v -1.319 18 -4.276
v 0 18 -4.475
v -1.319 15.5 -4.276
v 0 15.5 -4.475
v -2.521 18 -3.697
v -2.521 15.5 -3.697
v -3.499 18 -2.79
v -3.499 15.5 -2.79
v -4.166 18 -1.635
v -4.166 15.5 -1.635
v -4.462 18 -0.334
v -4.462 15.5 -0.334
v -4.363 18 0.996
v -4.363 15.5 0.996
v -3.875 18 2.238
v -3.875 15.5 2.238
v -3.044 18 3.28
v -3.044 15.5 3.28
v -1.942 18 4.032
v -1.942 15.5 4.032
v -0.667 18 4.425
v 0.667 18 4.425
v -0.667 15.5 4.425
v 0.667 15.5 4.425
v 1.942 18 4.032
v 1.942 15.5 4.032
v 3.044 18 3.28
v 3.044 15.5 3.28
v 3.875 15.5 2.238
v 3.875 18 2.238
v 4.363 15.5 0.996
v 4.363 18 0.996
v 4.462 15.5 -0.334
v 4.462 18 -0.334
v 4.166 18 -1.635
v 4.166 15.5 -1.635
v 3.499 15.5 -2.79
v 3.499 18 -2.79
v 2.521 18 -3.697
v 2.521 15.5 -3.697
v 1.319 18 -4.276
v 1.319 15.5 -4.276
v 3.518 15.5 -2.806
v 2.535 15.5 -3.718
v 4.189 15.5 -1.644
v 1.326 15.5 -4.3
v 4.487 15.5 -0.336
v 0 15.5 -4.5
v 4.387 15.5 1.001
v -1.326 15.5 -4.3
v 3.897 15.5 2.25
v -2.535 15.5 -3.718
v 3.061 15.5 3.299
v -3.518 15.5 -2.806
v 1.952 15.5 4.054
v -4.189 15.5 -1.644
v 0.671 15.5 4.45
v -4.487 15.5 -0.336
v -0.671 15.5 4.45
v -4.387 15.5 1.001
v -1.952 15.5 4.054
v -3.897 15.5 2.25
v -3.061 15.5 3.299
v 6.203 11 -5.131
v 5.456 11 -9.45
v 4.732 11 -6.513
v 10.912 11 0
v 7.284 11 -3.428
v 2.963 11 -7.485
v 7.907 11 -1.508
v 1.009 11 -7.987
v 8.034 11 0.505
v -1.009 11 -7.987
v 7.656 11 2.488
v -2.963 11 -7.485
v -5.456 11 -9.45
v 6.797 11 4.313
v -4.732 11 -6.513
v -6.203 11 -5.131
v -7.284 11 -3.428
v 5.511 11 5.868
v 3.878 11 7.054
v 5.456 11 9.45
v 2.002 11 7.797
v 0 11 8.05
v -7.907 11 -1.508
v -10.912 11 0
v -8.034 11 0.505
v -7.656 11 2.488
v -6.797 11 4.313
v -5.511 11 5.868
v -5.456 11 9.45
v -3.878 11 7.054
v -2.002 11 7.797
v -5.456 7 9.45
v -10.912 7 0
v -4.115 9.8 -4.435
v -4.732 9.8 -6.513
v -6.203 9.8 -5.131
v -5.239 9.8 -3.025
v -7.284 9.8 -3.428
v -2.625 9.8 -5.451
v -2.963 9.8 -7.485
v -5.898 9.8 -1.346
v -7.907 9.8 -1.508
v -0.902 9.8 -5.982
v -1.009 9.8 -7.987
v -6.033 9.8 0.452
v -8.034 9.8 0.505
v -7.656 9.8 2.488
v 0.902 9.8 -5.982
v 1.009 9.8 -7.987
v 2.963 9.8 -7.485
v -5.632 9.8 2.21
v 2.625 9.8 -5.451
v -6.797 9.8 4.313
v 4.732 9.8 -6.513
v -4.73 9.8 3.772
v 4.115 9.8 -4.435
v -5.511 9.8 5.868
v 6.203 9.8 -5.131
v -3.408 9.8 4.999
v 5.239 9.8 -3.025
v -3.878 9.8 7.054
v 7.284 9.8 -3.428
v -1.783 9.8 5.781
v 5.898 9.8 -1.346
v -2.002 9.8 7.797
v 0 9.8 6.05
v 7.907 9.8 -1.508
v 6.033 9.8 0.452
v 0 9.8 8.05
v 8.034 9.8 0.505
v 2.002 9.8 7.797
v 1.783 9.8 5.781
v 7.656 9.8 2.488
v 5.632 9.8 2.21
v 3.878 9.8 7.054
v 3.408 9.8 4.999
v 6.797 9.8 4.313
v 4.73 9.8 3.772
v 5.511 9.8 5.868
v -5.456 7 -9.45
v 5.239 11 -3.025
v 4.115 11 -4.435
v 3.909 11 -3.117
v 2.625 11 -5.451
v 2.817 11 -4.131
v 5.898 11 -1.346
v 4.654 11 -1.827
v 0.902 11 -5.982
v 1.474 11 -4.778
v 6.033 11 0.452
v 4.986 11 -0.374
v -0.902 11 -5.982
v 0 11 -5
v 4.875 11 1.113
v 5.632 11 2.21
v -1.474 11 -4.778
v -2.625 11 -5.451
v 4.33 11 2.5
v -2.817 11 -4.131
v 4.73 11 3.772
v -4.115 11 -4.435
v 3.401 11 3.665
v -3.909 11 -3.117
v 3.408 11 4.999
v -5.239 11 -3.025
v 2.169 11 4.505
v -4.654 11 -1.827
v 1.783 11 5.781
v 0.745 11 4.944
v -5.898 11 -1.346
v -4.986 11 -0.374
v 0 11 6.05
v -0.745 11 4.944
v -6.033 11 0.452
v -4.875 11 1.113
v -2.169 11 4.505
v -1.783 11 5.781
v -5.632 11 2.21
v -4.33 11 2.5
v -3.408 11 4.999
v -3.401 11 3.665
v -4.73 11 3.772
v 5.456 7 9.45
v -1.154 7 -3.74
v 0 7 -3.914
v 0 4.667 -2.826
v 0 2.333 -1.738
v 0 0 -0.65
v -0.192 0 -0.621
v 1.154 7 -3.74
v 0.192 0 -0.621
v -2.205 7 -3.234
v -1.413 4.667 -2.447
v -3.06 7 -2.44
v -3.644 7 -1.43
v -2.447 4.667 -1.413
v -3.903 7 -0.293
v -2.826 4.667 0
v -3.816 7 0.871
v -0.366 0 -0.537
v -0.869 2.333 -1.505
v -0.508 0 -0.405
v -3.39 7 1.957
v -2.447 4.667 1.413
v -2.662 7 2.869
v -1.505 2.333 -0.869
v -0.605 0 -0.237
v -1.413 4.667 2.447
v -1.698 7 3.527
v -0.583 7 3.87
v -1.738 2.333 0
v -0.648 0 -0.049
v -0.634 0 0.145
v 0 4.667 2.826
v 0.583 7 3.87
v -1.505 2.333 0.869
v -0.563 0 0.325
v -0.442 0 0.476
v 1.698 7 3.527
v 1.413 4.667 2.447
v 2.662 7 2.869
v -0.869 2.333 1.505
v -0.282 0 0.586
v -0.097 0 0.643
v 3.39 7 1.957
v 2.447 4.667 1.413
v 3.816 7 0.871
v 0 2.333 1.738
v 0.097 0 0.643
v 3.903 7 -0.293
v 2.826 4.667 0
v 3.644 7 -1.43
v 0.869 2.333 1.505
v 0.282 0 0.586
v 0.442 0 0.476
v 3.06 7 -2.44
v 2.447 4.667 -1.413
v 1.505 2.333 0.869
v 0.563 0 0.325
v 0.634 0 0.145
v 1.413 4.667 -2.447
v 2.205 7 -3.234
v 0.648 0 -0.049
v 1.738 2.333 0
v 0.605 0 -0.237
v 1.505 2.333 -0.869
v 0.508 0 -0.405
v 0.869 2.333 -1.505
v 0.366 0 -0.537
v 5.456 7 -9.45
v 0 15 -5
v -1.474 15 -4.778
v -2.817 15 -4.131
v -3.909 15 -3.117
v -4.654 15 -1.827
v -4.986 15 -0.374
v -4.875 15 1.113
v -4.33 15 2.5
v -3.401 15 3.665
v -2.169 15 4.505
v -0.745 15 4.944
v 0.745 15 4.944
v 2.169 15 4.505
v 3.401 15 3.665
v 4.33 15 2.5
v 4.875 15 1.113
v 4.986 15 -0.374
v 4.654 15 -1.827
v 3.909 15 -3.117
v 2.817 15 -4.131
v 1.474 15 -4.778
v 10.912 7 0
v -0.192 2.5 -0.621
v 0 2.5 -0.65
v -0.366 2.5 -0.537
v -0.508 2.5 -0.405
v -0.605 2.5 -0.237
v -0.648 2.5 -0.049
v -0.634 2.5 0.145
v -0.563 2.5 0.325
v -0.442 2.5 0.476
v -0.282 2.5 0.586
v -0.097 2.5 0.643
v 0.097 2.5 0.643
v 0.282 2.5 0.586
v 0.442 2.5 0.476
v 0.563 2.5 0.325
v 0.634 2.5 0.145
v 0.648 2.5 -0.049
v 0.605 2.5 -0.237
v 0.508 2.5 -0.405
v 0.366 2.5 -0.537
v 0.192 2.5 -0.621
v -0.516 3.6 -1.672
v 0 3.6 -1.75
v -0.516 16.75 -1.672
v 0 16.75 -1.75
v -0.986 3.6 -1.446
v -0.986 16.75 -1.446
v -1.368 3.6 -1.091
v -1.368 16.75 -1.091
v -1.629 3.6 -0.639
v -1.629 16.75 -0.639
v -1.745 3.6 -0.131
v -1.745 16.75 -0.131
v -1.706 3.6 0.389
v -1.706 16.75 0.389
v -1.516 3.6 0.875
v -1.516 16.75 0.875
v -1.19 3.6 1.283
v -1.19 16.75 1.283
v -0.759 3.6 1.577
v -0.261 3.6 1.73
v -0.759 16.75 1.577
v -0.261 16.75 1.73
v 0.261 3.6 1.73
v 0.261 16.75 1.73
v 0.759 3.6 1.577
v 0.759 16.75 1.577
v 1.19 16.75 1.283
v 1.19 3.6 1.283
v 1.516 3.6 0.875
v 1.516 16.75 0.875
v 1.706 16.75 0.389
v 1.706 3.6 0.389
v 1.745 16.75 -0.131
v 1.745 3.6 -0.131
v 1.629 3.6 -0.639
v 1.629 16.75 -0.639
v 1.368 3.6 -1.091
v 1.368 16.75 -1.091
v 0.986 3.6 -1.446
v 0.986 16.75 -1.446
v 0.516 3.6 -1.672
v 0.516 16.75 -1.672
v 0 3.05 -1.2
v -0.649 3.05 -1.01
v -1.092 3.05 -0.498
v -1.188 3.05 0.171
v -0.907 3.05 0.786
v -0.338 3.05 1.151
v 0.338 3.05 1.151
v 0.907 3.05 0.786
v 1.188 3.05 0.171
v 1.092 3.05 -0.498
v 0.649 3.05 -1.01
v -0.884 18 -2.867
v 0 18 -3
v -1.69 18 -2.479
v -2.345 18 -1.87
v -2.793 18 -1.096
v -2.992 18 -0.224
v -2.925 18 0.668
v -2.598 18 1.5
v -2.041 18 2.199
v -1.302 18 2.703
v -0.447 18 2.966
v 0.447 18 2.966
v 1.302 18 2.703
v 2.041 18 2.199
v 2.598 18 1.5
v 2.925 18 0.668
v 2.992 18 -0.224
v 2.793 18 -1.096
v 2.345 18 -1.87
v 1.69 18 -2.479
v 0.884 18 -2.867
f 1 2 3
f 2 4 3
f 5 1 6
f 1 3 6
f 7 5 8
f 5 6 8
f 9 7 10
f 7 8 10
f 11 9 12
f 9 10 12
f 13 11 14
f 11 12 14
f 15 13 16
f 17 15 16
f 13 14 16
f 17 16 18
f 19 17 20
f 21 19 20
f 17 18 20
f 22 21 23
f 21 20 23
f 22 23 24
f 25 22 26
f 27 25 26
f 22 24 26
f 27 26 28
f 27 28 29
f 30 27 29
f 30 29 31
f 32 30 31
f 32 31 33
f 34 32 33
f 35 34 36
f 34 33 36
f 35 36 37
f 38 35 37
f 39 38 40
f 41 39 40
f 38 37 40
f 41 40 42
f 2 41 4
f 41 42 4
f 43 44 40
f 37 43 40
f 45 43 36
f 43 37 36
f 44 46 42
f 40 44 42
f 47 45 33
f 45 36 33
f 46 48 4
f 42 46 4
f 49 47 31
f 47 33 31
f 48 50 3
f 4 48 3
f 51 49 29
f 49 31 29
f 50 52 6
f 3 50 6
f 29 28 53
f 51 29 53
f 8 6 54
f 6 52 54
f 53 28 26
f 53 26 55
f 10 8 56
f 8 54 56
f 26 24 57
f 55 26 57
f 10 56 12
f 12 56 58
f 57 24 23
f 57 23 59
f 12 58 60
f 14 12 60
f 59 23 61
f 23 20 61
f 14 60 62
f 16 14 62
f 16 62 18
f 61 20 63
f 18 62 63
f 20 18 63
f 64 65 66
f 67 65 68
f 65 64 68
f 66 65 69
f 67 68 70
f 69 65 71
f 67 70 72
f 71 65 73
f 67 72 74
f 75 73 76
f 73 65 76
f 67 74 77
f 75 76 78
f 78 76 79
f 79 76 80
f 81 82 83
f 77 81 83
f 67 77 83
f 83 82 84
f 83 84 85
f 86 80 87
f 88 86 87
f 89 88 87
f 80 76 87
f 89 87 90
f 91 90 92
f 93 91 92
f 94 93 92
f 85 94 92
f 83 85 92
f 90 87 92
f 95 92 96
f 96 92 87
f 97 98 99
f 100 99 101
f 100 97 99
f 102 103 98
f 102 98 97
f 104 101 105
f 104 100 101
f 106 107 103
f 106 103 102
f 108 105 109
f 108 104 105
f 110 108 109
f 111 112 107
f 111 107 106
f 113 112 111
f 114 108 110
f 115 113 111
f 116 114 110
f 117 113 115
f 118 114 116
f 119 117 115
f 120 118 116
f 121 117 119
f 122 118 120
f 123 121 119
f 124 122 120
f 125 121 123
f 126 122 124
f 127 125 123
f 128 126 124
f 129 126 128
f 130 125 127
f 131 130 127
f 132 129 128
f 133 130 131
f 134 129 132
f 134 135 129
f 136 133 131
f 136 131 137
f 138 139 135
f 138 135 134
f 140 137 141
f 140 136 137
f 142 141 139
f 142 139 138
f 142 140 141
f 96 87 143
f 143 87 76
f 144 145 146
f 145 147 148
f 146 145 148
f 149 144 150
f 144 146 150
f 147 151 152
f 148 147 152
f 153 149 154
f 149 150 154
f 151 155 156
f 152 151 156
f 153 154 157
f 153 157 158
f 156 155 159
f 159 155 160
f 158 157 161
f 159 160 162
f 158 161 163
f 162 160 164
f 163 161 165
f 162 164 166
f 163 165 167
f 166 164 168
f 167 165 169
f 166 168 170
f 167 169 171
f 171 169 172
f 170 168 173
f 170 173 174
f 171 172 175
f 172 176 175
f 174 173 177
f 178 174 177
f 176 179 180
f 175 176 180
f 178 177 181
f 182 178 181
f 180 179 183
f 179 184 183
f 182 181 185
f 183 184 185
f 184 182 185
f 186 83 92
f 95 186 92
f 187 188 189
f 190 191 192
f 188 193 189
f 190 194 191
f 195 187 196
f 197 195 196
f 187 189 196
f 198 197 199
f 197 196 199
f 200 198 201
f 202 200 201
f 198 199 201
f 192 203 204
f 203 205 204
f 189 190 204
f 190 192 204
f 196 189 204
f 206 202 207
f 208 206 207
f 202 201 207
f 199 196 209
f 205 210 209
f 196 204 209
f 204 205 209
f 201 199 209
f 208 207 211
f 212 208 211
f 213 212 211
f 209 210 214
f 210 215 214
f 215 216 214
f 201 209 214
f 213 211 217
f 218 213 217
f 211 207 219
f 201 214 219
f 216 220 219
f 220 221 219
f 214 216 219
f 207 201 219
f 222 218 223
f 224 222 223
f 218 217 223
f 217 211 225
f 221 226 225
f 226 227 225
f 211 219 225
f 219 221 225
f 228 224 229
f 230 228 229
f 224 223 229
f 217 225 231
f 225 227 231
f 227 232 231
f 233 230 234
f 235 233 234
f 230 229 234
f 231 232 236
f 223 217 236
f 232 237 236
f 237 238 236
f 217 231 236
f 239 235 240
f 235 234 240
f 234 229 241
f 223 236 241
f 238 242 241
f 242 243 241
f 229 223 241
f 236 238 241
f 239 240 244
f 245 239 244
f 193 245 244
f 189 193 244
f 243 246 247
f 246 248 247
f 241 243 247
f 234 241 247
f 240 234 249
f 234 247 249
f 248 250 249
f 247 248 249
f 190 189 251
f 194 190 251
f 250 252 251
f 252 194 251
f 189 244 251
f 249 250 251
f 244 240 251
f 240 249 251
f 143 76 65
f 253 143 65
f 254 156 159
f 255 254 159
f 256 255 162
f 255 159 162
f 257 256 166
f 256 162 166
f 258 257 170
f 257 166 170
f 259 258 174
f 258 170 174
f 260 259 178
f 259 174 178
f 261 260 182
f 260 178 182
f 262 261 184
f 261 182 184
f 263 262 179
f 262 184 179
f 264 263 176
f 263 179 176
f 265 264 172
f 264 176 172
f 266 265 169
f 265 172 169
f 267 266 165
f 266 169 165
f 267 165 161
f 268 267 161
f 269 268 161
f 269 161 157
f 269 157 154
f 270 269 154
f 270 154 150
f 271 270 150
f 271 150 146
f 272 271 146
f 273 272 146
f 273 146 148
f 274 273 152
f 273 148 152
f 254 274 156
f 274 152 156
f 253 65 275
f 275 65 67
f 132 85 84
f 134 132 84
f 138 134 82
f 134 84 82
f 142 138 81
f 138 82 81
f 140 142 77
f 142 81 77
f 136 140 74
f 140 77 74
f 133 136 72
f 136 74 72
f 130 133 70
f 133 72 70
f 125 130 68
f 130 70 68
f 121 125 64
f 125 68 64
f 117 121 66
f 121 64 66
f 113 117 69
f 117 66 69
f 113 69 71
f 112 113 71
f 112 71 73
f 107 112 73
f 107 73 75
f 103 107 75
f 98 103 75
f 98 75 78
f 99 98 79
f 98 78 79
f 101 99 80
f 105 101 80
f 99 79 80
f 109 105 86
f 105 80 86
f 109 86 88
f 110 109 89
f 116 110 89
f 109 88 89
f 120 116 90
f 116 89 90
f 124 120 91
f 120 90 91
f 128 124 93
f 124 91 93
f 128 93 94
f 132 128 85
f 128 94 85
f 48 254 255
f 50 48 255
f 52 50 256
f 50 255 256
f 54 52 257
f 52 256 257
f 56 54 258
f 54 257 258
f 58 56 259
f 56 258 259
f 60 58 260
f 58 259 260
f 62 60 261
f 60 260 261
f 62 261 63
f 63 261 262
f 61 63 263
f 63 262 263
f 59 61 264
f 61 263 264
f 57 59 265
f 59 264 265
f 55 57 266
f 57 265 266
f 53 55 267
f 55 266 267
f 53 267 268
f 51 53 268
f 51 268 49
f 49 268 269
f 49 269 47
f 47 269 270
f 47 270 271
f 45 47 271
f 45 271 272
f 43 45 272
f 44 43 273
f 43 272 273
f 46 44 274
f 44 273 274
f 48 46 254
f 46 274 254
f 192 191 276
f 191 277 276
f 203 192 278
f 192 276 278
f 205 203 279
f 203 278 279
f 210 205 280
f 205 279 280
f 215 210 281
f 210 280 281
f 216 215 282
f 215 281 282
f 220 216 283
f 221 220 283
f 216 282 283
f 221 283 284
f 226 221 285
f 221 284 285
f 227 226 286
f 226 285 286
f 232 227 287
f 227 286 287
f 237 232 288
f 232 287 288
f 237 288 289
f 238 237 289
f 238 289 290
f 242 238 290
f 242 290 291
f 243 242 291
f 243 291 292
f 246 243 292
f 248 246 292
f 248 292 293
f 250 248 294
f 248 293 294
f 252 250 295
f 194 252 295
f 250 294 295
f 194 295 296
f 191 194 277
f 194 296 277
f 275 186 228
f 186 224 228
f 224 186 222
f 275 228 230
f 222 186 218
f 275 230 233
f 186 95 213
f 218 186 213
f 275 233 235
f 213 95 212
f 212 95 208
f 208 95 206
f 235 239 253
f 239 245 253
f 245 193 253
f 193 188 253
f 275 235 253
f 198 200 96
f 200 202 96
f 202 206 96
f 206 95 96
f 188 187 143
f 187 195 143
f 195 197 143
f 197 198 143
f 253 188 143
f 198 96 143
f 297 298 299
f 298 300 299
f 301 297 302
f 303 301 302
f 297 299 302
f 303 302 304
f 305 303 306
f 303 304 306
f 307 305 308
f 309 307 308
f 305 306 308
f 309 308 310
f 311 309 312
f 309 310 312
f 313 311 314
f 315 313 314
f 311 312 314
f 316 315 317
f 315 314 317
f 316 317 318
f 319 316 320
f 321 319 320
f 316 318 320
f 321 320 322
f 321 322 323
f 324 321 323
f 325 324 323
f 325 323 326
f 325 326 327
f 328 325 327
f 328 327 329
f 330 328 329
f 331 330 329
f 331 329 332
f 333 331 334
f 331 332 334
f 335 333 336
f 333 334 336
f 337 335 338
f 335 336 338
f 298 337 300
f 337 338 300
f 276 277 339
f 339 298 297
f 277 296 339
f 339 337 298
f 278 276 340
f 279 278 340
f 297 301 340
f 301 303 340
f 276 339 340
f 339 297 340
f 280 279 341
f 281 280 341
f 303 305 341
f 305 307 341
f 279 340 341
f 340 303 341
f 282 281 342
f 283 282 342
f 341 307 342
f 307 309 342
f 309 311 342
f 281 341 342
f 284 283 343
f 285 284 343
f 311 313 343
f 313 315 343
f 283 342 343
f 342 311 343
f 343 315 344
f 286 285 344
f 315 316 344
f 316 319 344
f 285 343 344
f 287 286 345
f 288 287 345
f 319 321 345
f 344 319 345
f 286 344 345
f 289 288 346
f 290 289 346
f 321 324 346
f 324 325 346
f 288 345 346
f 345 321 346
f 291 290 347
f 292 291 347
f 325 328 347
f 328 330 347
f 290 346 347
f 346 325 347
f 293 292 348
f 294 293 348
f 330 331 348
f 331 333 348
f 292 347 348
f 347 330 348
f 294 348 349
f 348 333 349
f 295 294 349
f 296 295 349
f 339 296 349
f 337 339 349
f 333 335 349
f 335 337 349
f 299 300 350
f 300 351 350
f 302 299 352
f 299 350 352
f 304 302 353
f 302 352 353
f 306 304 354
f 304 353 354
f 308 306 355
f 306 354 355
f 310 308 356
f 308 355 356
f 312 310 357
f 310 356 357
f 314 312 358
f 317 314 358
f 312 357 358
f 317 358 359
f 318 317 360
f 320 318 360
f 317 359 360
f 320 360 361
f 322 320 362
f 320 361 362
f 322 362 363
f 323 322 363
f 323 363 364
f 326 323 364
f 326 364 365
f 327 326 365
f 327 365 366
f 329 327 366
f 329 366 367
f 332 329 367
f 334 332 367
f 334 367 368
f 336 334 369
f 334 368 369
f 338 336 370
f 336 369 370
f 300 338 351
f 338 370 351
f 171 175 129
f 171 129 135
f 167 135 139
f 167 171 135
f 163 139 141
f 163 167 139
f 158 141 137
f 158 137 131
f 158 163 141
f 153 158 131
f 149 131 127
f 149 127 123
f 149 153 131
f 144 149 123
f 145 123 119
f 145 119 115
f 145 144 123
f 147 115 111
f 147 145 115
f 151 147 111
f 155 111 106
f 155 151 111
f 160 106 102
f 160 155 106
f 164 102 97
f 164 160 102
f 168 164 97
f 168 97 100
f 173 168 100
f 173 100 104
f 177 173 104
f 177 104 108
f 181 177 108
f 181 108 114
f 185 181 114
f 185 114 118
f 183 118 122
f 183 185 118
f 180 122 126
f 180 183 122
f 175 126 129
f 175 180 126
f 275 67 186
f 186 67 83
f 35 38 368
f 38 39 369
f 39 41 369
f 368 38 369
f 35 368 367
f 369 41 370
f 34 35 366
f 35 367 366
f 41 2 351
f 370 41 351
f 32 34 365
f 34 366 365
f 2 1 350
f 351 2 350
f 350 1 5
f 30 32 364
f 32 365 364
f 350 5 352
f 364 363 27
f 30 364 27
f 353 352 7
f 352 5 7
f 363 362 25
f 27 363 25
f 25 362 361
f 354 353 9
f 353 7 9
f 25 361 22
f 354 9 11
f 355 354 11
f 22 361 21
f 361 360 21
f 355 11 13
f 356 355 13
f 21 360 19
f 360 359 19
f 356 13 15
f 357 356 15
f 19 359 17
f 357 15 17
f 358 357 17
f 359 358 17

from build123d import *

# Parameters (mm, degrees)
CHANFREIN1_SIZE         = 0.5
ESQUISSE2_R             = 12.5
ENL_V_MAT_EXTRU_1_DEPTH = 21.820662814
ESQUISSE3_R             = 8.05
ESQUISSE3_R_2           = 6.05
ENL_V_MAT_EXTRU_2_DEPTH = 1.2


with BuildPart() as part:
    # Esquisse1 → Révolution1 (revolve)
    with BuildSketch(Plane.XY, mode=Mode.PRIVATE) as r_volution1_sk:
        Polygon((0.65, 0), (0.65, 2.5), (1.75, 3.6), (1.75, 16.75), (3, 18), (4.475, 18), (4.475, 15.5), (5, 15.5), (5, 11), (12.5, 11), (12.5, 7), (3.914153607, 7), align=None)
    revolve(r_volution1_sk.sketch.rotate(Axis((0, 0, 0), (0, 1, 0)), 90), axis=Axis((0, 0, 0), (0, 1, 0)))

    # Chanfrein1
    chanfrein1_edges = [part.edges().sort_by_distance(p)[0] for p in [
        (0, 15.5, 5),
    ]]
    chamfer(chanfrein1_edges, length=CHANFREIN1_SIZE)

    # Esquisse2 → Enlèv. mat.-Extru.1 (cut, through all)
    with BuildSketch(Plane(origin=(0, 11, 0), x_dir=(1, 0, 0), z_dir=(0, 1, 0))):
        Circle(ESQUISSE2_R)
        Polygon((-10.911920088, 0), (-5.455960044, 9.45), (5.455960044, 9.45), (10.911920088, 0), (5.455960044, -9.45), (-5.455960044, -9.45), align=None, mode=Mode.SUBTRACT)
    extrude(amount=-ENL_V_MAT_EXTRU_1_DEPTH, mode=Mode.SUBTRACT)

    # Esquisse3 → Enlèv. mat.-Extru.2 (cut)
    with BuildSketch(Plane(origin=(0, 11, 0), x_dir=(1, 0, 0), z_dir=(0, 1, 0))):
        with Locations(Location((0, 0, 0), (0, 0, 270))):
            Circle(ESQUISSE3_R)
        with Locations(Location((0, 0, 0), (0, 0, 270))):
            Circle(ESQUISSE3_R_2, mode=Mode.SUBTRACT)
    extrude(amount=-ENL_V_MAT_EXTRU_2_DEPTH, mode=Mode.SUBTRACT)


solid = part.part
